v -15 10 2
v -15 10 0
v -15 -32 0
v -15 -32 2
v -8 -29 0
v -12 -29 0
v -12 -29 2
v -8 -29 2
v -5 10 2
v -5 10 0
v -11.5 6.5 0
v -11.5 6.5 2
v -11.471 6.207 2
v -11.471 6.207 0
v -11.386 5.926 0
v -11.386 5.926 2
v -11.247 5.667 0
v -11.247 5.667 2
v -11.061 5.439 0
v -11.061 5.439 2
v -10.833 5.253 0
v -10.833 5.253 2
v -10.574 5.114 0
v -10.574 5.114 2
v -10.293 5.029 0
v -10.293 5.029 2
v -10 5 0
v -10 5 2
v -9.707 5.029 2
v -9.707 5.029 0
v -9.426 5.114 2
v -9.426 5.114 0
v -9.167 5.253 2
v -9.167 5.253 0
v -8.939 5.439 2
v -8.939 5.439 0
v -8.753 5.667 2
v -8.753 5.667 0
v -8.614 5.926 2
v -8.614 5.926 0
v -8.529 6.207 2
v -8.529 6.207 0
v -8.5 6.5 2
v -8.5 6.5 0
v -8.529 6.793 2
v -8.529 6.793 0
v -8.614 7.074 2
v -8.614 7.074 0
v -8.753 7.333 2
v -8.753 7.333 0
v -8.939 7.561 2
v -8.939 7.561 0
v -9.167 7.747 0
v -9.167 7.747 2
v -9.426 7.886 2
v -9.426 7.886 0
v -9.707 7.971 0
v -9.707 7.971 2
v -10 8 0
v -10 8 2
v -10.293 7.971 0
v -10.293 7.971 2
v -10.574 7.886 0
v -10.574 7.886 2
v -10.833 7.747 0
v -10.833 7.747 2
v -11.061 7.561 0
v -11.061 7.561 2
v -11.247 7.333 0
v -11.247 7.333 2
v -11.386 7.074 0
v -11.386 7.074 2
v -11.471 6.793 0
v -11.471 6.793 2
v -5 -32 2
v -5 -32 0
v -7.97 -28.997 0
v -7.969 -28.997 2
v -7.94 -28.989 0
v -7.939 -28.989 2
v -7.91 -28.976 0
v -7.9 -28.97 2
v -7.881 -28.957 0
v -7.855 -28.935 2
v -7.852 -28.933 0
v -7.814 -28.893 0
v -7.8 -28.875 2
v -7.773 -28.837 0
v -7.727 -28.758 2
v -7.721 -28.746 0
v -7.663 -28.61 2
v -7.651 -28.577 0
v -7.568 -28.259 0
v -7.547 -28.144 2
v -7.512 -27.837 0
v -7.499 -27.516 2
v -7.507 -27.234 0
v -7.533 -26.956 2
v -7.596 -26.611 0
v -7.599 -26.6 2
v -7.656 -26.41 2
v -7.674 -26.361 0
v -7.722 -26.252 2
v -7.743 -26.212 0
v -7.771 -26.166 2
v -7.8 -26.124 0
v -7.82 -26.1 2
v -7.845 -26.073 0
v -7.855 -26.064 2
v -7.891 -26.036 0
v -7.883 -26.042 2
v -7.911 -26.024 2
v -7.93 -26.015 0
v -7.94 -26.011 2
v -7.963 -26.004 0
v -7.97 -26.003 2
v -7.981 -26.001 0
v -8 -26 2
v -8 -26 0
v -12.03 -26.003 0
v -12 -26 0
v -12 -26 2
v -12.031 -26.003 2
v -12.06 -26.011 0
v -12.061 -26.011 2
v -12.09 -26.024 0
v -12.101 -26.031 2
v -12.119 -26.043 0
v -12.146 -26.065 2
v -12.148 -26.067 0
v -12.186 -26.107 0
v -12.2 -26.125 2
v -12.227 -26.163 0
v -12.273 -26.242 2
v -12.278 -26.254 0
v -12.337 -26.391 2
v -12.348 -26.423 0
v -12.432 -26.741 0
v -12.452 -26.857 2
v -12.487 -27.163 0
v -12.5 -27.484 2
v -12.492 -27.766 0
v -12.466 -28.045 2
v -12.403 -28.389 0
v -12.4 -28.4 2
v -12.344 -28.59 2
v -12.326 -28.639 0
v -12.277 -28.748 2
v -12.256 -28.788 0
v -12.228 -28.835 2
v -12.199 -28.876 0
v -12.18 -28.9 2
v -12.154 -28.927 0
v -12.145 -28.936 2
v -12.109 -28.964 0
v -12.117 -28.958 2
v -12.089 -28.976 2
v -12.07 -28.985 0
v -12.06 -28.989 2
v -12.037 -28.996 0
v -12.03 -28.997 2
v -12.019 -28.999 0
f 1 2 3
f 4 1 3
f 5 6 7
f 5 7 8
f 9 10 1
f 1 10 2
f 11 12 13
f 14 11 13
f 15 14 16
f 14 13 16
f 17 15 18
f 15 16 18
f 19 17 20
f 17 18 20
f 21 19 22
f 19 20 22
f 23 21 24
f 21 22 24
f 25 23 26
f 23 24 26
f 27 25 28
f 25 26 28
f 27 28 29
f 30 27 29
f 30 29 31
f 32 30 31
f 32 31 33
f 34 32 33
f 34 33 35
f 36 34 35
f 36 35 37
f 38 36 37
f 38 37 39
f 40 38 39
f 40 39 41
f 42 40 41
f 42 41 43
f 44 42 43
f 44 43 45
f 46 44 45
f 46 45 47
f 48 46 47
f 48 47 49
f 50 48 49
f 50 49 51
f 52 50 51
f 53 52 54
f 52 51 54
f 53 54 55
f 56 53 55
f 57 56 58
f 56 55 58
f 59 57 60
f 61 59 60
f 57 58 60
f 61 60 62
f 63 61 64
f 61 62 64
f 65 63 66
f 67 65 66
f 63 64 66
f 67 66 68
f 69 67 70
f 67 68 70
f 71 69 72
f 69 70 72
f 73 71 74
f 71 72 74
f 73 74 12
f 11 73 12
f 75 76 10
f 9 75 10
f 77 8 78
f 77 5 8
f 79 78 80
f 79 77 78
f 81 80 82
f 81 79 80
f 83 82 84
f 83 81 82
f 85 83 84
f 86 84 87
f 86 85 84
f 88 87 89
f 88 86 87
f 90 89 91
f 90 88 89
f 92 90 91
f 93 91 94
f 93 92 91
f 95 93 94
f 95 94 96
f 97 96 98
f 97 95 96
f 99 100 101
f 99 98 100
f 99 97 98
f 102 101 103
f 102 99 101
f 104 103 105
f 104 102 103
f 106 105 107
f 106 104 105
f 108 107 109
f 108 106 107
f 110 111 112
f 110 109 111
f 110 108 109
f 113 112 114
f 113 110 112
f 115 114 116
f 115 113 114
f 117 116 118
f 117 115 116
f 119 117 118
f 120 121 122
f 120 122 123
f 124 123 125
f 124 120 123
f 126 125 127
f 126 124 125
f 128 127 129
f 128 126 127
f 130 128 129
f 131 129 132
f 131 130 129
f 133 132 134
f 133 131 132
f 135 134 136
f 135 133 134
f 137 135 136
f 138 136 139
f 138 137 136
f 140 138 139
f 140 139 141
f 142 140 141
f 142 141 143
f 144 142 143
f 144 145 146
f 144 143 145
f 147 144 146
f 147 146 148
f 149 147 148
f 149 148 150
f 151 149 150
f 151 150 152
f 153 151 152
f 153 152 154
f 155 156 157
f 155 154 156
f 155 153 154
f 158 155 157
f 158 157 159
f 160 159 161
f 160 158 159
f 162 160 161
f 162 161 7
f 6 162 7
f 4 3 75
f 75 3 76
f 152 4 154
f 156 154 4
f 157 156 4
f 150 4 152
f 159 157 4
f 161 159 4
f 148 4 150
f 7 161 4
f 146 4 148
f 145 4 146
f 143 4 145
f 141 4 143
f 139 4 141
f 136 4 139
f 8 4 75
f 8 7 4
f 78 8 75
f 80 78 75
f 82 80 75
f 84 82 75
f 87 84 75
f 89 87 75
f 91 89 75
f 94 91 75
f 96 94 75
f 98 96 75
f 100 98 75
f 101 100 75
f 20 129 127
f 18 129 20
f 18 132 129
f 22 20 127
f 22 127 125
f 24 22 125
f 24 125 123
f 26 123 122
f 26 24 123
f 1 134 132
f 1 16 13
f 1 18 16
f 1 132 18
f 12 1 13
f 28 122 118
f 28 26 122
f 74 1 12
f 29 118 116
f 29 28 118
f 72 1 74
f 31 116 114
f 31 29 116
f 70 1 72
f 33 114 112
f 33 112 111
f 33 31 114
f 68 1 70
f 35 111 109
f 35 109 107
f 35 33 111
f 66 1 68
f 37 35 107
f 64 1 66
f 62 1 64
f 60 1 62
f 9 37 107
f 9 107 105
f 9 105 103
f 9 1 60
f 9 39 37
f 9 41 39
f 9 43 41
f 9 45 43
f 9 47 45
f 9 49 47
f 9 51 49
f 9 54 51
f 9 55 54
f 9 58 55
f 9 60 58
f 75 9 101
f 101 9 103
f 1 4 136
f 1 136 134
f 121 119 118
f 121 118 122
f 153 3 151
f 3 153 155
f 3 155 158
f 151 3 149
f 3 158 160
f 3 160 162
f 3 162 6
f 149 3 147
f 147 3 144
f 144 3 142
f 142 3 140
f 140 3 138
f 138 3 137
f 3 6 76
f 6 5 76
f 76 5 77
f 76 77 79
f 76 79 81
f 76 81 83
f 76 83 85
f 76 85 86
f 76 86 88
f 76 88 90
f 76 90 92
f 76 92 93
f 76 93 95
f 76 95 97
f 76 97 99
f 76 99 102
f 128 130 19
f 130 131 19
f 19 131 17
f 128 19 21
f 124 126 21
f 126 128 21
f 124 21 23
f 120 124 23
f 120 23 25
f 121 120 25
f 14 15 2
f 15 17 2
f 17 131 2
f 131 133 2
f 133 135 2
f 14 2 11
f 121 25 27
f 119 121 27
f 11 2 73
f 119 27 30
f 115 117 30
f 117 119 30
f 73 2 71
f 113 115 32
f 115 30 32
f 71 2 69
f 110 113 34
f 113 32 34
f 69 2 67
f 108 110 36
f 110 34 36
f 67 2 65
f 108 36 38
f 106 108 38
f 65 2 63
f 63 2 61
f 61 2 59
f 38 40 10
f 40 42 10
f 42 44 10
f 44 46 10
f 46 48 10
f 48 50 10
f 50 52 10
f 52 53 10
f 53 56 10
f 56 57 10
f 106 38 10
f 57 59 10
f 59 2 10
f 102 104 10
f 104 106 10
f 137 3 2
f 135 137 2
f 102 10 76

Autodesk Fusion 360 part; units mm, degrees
sketch "Sketch1" plane through (0, 0, 0) normal (1, 0, 0) x (0, 1, 0)
  line L0 (-5, 6) -> (11.1286, 6)
  line L1 (11.1286, 6) -> (11.1286, -7.5034)
  line L2 (11.1286, -7.5034) -> (-5, -7.5034)
  line L3 (-5, -7.5034) -> (-5, 6)
sketch "Sketch2" plane through (0, 0, 0) normal (1, 0, 0) x (0, 1, 0)
  line L0 (-28, 22) -> (-16, 22)
  line L1 (-16, 22) -> (-16, 10.6443)
  line L2 (-16, 10.6443) -> (-36, 10.6443)
  line L3 (-36, 10.6443) -> (-28, 22)
sketch "Sketch3" plane through (0, 0, 0) normal (0, 0, 1) x (1, 0, 0)
  circle A0 centre (-31.5, 17.5) radius 1.5811
sketch "Sketch4" plane through (0, 0, 0) normal (0, 0, 1) x (1, 0, 0)
  line L0 (-20, 25) -> (-5, 25)
  line L1 (-5, 25) -> (-5, 5)
  line L2 (-5, 5) -> (-20, 5)
  line L3 (-20, 5) -> (-20, 25)
sketch "Sketch5" plane through (0, 0, 2.8539) normal (0, 0, 1) x (-1, 0, 0)
  line L0 (20, -5) -> (5, -5)
  line L1 (5, -5) -> (5, -25)
  line L2 (5, -25) -> (20, -25)
  line L3 (20, -25) -> (20, -5)
  line L4 (13.5, -20) -> (10.5, -20)
  arc A0 (10.5, -18.5) -> (10.5, -20) centre (10.5, -19.25) ccw
  line L5 (10.5, -18.5) -> (13.5, -18.5)
  arc A1 (13.5, -20) -> (13.5, -18.5) centre (13.5, -19.25) ccw
sketch "Sketch6" plane through (0, 0, 2.8539) normal (0, 0, 1) x (-1, 0, 0)
  line L0 (13.5, -20) -> (10.5, -20)
  arc A0 (10.5, -18.5) -> (10.5, -20) centre (10.5, -19.25) ccw
  line L1 (10.5, -18.5) -> (13.5, -18.5)
  arc A1 (13.5, -20) -> (13.5, -18.5) centre (13.5, -19.25) ccw
  line L2 (20, -5) -> (5, -5)
  line L3 (5, -5) -> (5, -25)
  line L4 (5, -25) -> (20, -25)
  line L5 (20, -25) -> (20, -5)
  circle A2 centre (12, -7) radius 1
  dimension "d11" = 2
sketch "Sketch7" plane through (0, 0, 0) normal (0, 0, 1) x (1, 0, 0)
  line L0 (-5, 10) -> (-15, 10)
  line L1 (-15, 10) -> (-15, -32)
  line L2 (-15, -32) -> (-5, -32)
  line L3 (-5, -32) -> (-5, 10)
  dimension "d14" = 42
  dimension "d15" = 10
extrude "Extrude7" add sketch "Sketch7" along normal blind 2
sketch "Sketch8" plane through (0, 0, 2) normal (0, 0, 1) x (-1, 0, 0)
  line L0 (5, 32) -> (5, -10)
  line L1 (5, -10) -> (15, -10)
  line L2 (15, -10) -> (15, 32)
  line L3 (15, 32) -> (5, 32)
  circle A0 centre (10, -6.5) radius 1.5
  dimension "d18" = 3
extrude "Extrude8" cut sketch "Sketch8" against normal blind 7 contours A0
sketch "Sketch9" plane through (0, 0, 0) normal (0, 0, 1) x (1, 0, 0)
  line L0 (-15, -32) -> (-5, -32)
  line L1 (-15, 10) -> (-15, -32)
  line L2 (-12, -29) -> (-8, -29)
  line L3 (-8, -26) -> (-12, -26)
  ellipse E0 centre (-12, -27.5) end of major axis (-12, -29) minor radius 0.5003 (-12, -26) -> (-12, -29) ccw
  ellipse E1 centre (-8, -27.5) end of major axis (-8, -29) minor radius 0.5011 (-8, -29) -> (-8, -26) ccw
extrude "Extrude9" cut sketch "Sketch9" along normal blind 3.5
sketch "Sketch10" plane through (0, 0, 0) normal (0, 0, 1) x (1, 0, 0)
  line L0 (-5, 10) -> (-15, 10)
  line L1 (15, -15) -> (35, -15)
  line L2 (15, -15) -> (15, -5)
  line L3 (15, -5) -> (35, -5)
  line L4 (35, -5) -> (35, -15)
  dimension "d27" = 20
sketch "Sketch11" plane through (0, 0, 0) normal (1, 0, 0) x (0, 1, 0)
  line L0 (-32, 0) -> (10, 0)
  line L1 (-5, 0) -> (-5, 1)
  line L2 (-15, 0) -> (-5, 0)
  line L3 (-5, 0) -> (-7.5, 3)
  line L4 (-7.5, 3) -> (-12.5, 3)
  line L5 (-12.5, 3) -> (-15, 0)
  point P0 (-15, 0)
  point P1 (-15, 0)
sketch "Sketch12" plane through (0, 0, 0) normal (1, 0, 0) x (0, 1, 0)
  circle A0 centre (-2.5, 7.5) radius 1.25
  dimension "d32" = 2.5
sketch "Sketch13" plane through (16, 0, 0) normal (1, 0, 0) x (0, 1, 0)
